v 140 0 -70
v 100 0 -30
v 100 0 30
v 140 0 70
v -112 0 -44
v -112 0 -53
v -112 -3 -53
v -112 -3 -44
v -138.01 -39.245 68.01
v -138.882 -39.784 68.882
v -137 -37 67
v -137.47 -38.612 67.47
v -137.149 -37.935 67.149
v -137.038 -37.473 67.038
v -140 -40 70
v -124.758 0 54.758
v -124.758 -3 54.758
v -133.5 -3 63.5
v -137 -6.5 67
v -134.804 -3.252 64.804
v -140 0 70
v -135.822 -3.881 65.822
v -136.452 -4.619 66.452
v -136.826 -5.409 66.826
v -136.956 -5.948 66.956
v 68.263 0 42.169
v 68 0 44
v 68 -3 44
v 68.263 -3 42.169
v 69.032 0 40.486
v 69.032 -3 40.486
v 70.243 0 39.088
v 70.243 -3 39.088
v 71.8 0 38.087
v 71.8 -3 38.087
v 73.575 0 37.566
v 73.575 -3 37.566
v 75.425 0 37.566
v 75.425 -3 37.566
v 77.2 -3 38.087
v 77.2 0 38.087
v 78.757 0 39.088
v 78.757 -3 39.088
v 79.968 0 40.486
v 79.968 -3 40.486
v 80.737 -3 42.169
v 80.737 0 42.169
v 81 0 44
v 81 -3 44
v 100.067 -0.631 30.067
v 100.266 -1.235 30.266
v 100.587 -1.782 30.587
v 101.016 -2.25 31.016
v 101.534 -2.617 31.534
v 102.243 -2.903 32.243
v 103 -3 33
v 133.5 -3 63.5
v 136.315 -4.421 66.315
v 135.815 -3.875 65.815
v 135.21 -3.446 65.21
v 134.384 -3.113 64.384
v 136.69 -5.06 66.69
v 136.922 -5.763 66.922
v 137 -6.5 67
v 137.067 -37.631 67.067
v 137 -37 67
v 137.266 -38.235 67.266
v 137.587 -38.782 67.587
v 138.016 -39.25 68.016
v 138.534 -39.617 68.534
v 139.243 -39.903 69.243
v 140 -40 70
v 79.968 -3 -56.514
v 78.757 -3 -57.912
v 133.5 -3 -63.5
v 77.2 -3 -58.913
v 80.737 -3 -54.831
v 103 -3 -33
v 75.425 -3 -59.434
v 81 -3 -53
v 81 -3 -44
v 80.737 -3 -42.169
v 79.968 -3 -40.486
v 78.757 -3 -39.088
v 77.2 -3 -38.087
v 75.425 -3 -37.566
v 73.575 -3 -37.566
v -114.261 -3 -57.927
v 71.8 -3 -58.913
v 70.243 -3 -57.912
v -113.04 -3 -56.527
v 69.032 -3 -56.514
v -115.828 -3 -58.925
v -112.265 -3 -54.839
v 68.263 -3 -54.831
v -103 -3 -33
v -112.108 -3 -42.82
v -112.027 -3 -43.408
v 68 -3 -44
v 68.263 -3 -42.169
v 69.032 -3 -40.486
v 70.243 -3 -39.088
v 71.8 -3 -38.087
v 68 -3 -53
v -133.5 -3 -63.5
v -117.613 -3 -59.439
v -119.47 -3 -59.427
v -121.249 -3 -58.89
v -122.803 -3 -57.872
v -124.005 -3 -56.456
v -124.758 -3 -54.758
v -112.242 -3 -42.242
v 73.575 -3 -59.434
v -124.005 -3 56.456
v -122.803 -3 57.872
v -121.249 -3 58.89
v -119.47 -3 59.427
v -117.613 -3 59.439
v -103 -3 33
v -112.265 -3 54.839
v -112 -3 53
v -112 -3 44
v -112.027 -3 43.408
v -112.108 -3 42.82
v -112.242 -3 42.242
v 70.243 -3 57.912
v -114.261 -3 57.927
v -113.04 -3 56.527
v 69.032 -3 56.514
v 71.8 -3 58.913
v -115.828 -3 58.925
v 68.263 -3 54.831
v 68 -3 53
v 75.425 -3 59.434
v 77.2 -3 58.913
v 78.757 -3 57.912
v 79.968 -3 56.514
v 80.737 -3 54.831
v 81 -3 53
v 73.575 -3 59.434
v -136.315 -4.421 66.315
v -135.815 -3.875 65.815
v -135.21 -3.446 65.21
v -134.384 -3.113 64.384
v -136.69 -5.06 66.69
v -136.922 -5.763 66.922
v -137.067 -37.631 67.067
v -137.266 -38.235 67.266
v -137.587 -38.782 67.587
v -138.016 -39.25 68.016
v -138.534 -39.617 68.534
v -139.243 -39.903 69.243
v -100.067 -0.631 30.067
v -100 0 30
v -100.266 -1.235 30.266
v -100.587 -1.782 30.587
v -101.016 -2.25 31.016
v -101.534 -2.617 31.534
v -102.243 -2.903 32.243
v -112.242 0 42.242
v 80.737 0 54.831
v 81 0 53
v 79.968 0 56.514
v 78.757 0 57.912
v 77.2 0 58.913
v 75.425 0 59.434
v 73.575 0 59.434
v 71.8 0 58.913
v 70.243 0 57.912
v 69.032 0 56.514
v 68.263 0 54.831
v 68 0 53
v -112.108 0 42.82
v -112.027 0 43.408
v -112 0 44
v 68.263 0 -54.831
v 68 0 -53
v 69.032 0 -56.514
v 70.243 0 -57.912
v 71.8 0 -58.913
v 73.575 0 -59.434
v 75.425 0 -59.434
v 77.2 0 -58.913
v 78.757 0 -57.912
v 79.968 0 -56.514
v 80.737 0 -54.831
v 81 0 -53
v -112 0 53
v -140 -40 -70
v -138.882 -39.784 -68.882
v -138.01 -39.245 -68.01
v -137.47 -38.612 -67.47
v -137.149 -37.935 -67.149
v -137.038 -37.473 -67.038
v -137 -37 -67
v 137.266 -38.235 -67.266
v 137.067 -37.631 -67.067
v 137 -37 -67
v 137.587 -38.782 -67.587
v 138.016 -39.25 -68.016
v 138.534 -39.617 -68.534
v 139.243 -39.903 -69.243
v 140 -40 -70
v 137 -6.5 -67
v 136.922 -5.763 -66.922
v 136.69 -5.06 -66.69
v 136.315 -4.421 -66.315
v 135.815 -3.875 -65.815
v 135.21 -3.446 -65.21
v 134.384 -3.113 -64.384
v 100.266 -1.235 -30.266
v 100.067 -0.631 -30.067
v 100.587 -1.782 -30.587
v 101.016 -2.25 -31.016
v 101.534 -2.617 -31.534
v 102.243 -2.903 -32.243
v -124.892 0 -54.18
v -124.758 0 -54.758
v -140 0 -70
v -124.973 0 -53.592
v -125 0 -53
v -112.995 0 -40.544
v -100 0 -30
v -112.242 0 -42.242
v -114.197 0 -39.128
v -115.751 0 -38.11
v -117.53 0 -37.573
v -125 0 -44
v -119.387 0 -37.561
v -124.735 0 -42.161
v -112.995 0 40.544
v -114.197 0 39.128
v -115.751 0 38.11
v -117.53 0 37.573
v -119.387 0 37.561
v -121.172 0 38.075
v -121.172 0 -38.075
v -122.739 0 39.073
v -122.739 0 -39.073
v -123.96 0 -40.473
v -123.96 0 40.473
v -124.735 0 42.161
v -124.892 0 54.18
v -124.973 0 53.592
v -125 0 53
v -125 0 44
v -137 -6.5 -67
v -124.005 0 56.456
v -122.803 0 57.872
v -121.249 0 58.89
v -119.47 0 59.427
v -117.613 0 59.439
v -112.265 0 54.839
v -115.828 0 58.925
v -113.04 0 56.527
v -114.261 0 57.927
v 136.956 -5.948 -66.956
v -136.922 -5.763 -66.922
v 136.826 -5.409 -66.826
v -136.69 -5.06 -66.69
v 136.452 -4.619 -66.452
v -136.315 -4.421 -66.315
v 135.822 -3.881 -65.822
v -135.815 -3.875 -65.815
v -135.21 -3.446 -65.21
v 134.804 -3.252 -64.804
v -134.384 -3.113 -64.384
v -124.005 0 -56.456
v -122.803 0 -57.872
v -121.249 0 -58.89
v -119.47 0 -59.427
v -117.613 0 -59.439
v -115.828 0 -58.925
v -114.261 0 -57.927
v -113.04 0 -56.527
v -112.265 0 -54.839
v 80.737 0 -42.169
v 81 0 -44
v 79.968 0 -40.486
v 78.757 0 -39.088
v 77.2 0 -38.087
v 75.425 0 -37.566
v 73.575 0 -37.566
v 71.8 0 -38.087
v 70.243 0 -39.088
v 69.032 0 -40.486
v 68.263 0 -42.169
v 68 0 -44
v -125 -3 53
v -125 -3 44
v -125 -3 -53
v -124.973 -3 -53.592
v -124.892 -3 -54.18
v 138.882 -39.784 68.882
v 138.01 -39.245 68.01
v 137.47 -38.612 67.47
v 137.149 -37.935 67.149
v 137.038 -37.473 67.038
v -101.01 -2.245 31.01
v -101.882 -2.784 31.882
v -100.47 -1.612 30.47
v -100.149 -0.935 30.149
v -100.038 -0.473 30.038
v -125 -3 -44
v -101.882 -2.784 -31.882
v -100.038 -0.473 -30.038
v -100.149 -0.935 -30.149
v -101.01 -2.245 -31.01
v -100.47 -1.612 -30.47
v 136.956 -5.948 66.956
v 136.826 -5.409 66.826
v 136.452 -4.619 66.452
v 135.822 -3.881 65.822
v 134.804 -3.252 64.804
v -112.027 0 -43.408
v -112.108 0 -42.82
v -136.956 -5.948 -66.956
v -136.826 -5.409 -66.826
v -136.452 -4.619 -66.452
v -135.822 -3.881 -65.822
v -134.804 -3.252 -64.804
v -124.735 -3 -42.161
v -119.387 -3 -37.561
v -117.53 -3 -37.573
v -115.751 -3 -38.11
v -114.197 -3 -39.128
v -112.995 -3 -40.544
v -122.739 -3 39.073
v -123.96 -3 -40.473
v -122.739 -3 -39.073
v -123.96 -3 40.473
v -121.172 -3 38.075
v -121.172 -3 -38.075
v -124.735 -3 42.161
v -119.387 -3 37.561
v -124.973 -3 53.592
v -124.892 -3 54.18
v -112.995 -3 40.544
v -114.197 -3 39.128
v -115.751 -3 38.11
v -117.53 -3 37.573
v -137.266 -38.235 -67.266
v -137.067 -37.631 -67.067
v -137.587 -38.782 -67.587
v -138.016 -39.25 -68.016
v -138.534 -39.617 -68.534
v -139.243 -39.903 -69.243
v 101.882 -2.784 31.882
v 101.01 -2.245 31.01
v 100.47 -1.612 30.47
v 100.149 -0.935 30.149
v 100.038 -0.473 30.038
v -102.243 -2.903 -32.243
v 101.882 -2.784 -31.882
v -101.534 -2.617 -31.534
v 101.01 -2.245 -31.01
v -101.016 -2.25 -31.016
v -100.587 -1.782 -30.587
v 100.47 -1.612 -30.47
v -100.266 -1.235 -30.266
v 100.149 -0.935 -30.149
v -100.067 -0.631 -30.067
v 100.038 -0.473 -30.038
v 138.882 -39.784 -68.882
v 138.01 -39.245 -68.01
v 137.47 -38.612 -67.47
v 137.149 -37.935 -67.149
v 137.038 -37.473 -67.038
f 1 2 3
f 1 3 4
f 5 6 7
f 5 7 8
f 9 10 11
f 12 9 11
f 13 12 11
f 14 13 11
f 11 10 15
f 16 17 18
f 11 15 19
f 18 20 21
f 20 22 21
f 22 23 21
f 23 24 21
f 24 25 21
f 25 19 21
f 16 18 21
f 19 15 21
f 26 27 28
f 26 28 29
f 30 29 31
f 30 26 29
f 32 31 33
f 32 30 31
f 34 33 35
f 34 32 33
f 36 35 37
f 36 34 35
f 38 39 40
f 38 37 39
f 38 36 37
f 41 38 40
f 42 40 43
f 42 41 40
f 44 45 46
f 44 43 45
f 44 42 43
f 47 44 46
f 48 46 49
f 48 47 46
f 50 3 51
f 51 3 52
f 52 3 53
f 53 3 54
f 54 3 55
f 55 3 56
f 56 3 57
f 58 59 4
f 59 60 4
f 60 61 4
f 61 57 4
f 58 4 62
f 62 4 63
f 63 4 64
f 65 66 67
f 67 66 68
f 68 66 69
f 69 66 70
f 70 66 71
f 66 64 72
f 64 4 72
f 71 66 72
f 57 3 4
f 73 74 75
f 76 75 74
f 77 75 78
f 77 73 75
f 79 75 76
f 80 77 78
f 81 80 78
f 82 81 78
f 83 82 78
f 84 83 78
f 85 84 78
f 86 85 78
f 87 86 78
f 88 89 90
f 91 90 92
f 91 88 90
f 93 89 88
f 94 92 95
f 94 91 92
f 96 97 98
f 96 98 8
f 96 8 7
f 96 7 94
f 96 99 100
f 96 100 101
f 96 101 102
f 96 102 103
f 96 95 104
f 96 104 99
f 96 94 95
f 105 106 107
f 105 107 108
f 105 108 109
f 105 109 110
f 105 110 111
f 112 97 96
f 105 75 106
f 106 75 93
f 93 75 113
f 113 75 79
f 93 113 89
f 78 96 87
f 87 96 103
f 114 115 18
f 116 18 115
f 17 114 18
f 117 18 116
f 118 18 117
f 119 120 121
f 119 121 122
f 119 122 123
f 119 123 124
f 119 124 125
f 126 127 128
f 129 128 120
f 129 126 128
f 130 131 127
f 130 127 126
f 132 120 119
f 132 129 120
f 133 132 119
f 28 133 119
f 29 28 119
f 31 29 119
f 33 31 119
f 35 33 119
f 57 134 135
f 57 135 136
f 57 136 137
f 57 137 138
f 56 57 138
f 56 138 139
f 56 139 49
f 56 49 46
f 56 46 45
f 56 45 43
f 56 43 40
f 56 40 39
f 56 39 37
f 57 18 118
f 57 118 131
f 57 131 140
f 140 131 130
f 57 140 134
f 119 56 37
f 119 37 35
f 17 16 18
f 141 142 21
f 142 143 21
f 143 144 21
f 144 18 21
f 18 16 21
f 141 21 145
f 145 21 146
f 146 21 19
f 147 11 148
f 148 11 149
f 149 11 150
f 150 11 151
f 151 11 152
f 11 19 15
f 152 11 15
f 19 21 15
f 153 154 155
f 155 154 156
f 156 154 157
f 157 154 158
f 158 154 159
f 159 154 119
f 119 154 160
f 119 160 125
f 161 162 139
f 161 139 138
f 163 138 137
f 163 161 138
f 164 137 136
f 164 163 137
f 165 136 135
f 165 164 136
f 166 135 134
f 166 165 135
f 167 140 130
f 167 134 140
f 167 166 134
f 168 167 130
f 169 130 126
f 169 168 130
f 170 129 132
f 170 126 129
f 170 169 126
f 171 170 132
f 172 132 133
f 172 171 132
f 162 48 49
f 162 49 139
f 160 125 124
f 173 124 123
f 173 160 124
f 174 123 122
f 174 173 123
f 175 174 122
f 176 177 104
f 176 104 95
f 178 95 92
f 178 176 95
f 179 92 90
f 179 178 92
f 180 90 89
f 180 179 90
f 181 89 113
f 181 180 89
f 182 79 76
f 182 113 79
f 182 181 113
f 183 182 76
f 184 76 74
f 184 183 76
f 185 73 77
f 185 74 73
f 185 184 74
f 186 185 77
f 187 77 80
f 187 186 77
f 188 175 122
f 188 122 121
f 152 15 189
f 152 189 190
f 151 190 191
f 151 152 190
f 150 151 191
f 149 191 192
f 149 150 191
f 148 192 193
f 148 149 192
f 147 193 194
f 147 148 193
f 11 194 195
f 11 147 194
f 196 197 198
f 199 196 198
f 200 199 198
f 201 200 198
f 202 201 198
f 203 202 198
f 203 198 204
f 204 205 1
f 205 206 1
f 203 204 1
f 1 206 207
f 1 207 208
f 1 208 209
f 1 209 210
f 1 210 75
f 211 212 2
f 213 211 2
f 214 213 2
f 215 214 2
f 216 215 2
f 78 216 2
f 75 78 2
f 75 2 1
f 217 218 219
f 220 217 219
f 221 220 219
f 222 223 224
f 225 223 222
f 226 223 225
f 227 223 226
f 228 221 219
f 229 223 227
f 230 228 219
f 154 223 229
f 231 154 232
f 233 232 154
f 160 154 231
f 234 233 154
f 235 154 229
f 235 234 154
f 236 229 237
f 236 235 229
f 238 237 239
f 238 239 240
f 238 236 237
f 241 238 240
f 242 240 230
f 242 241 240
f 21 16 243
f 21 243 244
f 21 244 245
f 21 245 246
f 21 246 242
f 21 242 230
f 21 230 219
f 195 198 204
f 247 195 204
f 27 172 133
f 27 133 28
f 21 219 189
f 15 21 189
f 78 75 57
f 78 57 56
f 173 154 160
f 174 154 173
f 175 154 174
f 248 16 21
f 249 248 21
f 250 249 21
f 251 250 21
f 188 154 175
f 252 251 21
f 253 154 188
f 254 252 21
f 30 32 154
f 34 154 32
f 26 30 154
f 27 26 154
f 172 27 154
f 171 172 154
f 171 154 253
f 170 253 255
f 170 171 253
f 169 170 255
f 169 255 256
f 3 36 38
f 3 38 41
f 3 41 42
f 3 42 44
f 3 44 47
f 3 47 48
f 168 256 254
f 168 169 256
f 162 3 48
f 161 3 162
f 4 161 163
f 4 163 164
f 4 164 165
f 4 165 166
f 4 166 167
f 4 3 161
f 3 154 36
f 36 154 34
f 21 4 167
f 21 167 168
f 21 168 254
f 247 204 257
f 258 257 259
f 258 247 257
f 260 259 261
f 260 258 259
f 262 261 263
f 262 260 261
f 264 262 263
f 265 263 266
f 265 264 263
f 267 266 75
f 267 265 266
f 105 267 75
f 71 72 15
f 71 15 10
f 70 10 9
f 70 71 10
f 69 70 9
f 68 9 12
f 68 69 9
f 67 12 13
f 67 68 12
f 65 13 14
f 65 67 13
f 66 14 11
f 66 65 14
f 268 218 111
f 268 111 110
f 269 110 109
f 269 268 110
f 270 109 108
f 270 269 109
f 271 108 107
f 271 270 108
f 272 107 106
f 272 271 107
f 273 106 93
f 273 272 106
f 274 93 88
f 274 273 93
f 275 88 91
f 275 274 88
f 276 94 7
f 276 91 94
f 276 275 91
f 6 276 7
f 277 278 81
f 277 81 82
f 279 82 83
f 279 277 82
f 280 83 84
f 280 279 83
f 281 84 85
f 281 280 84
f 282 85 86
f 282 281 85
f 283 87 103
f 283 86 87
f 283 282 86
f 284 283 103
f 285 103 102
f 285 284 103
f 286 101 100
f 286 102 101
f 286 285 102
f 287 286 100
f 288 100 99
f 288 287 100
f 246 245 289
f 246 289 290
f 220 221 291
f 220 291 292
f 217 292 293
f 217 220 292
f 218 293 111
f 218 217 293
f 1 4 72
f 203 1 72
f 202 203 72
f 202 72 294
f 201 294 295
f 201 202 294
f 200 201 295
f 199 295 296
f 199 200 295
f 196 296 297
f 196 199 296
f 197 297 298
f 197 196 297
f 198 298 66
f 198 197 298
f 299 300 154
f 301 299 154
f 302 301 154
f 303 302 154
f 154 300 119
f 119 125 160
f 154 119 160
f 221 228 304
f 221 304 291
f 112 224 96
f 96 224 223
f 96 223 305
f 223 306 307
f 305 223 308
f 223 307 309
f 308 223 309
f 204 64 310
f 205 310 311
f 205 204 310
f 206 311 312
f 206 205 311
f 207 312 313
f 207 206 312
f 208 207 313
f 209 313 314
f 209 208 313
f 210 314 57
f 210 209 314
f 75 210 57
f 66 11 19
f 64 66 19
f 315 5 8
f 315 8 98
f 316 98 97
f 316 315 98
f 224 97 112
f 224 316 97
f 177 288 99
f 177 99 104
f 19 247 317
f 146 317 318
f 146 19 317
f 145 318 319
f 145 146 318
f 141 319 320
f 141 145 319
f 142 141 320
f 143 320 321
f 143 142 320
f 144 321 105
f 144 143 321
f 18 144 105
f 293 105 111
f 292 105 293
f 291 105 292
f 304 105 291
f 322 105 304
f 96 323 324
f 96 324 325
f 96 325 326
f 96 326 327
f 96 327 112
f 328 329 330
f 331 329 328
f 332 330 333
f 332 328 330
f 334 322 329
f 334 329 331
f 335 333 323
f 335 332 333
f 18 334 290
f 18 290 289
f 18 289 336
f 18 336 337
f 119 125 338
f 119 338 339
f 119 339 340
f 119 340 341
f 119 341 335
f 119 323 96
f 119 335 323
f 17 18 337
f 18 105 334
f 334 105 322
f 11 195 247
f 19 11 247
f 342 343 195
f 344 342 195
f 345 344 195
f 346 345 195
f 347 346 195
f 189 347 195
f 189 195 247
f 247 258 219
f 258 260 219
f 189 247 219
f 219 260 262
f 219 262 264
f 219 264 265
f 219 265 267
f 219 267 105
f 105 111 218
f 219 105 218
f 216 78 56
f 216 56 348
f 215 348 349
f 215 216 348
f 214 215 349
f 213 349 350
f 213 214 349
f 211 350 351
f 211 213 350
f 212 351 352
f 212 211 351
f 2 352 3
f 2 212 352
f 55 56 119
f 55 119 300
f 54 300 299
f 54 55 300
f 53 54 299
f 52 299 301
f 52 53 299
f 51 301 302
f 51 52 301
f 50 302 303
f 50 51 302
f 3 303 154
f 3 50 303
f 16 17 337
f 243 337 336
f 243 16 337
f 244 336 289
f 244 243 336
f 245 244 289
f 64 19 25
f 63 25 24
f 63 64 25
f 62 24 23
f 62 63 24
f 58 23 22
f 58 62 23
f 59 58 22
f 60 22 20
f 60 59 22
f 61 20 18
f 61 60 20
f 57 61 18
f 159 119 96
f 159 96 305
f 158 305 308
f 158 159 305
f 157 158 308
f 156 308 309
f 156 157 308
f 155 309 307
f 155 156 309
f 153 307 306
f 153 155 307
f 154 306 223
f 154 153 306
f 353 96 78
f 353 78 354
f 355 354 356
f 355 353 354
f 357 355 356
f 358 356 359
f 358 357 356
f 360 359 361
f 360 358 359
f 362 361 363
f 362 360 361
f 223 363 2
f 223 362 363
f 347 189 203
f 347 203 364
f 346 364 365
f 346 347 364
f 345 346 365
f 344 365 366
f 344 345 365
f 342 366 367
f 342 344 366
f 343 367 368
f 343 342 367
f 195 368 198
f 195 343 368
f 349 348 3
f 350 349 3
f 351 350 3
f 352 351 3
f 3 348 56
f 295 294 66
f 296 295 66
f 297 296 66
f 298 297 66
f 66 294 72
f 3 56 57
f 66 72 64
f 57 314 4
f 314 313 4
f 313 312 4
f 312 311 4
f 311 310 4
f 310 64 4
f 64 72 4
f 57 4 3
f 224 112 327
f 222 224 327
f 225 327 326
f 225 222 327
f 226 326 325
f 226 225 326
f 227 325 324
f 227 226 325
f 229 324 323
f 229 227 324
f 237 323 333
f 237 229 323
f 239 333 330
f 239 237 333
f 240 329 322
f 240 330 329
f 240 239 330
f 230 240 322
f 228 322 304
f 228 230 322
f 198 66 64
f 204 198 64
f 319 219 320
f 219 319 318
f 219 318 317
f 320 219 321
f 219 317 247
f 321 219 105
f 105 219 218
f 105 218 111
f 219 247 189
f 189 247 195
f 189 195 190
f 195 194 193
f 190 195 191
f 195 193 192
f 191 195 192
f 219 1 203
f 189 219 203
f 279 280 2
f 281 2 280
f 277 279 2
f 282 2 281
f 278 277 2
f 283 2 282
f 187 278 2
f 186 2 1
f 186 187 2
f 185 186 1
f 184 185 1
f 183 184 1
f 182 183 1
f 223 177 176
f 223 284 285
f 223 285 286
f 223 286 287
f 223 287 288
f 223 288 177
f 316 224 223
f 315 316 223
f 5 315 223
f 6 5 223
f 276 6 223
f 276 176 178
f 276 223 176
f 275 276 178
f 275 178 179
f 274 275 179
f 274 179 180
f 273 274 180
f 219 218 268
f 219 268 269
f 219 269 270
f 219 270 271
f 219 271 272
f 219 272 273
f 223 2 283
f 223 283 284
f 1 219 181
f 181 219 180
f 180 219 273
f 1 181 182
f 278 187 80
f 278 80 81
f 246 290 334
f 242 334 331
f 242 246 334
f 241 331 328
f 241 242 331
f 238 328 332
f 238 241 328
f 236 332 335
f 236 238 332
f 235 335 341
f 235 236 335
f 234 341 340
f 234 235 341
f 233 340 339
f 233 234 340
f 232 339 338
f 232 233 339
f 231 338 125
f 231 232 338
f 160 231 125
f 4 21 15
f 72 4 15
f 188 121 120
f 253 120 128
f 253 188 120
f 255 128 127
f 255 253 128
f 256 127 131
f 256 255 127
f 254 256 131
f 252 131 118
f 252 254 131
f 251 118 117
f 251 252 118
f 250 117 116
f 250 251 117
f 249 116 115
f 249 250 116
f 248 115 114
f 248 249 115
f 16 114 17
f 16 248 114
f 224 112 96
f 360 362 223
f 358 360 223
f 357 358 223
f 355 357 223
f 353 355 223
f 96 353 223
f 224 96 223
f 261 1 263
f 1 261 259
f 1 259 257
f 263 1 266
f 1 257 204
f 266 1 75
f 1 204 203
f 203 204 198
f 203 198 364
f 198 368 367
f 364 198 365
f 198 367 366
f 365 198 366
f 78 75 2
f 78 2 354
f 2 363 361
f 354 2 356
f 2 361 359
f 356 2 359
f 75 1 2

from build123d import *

# Parameters (mm, degrees)
IRON_V40X40X3_1_DEPTH      = 197.568542495
IRON_V40X40X3_1_DEPTH_BACK = 57.568542495
IRON_V40X40X3_1_2_DEPTH    = 395.13708499
IRON_V40X40X3_1_3_DEPTH    = 255.13708499
IRON_V40X40X3_1_4_DEPTH    = 395.13708499
CUT_EXTRUDE1_DEPTH         = 10


with BuildPart() as part:
    # Sketch1 → Iron V40X40X3(1) (new, two sides: drawn at the far end of the back side and taken through both)
    with BuildSketch(Plane(origin=(-140, 0, 70), x_dir=(1, 0, 0), z_dir=(0, 0, -1)).offset(-IRON_V40X40X3_1_DEPTH_BACK)):
        with BuildLine():
            Line((0, 0), (0, 40))
            ThreePointArc((0, 40), (2.121320344, 39.121320344), (3, 37))
            Line((3, 37), (3, 6.5))
            ThreePointArc((3, 6.5), (4.025126266, 4.025126266), (6.5, 3))
            Line((6.5, 3), (37, 3))
            ThreePointArc((37, 3), (39.121320344, 2.121320344), (40, 0))
            Line((40, 0), (0, 0))
        make_face()
    extrude(amount=IRON_V40X40X3_1_DEPTH + IRON_V40X40X3_1_DEPTH_BACK)

    # Iron V40X40X3(1) mitre 1
    split(bisect_by=Plane(origin=(-140, 0, 70), x_dir=(0, -1, 0), z_dir=(-0.707106781, 0, -0.707106781)), keep=Keep.TOP)

    # Iron V40X40X3(1) mitre 2
    split(bisect_by=Plane(origin=(-140, 0, -70), x_dir=(0, -1, 0), z_dir=(-0.707106781, 0, 0.707106781)), keep=Keep.TOP)


with BuildPart() as body_2:
    # Sketch1 on segment 2 (carried to segment 2) → Iron V40X40X3_1 2 (new body)
    with BuildSketch(Plane(origin=(-197.568542495, 0, -70), x_dir=(0, 0, 1), z_dir=(1, 0, 0))):
        with BuildLine():
            Line((0, 0), (0, 40))
            ThreePointArc((0, 40), (2.121320344, 39.121320344), (3, 37))
            Line((3, 37), (3, 6.5))
            ThreePointArc((3, 6.5), (4.025126266, 4.025126266), (6.5, 3))
            Line((6.5, 3), (37, 3))
            ThreePointArc((37, 3), (39.121320344, 2.121320344), (40, 0))
            Line((40, 0), (0, 0))
        make_face()
    extrude(amount=IRON_V40X40X3_1_2_DEPTH)

    # Iron V40X40X3_1 2 mitre 1
    split(bisect_by=Plane(origin=(-140, 0, -70), x_dir=(0, 1, 0), z_dir=(0.707106781, 0, -0.707106781)), keep=Keep.TOP)

    # Iron V40X40X3_1 2 mitre 2
    split(bisect_by=Plane(origin=(140, 0, -70), x_dir=(0, -1, 0), z_dir=(-0.707106781, 0, -0.707106781)), keep=Keep.TOP)


with BuildPart() as body_3:
    # Sketch1 on segment 3 (carried to segment 3) → Iron V40X40X3_1 3 (new body)
    with BuildSketch(Plane(origin=(140, 0, -127.568542495), x_dir=(-1, 0, 0), z_dir=(0, 0, 1))):
        with BuildLine():
            Line((0, 0), (0, 40))
            ThreePointArc((0, 40), (2.121320344, 39.121320344), (3, 37))
            Line((3, 37), (3, 6.5))
            ThreePointArc((3, 6.5), (4.025126266, 4.025126266), (6.5, 3))
            Line((6.5, 3), (37, 3))
            ThreePointArc((37, 3), (39.121320344, 2.121320344), (40, 0))
            Line((40, 0), (0, 0))
        make_face()
    extrude(amount=IRON_V40X40X3_1_3_DEPTH)

    # Iron V40X40X3_1 3 mitre 1
    split(bisect_by=Plane(origin=(140, 0, 70), x_dir=(0, 1, 0), z_dir=(0.707106781, 0, -0.707106781)), keep=Keep.TOP)

    # Iron V40X40X3_1 3 mitre 2
    split(bisect_by=Plane(origin=(140, 0, -70), x_dir=(0, 1, 0), z_dir=(0.707106781, 0, 0.707106781)), keep=Keep.TOP)


with BuildPart() as body_4:
    # Sketch1 on segment 4 (carried to segment 4) → Iron V40X40X3_1 4 (new body)
    with BuildSketch(Plane(origin=(197.568542495, 0, 70), x_dir=(0, 0, -1), z_dir=(-1, 0, 0))):
        with BuildLine():
            Line((0, 0), (0, 40))
            ThreePointArc((0, 40), (2.121320344, 39.121320344), (3, 37))
            Line((3, 37), (3, 6.5))
            ThreePointArc((3, 6.5), (4.025126266, 4.025126266), (6.5, 3))
            Line((6.5, 3), (37, 3))
            ThreePointArc((37, 3), (39.121320344, 2.121320344), (40, 0))
            Line((40, 0), (0, 0))
        make_face()
    extrude(amount=IRON_V40X40X3_1_4_DEPTH)

    # Iron V40X40X3_1 4 mitre 1
    split(bisect_by=Plane(origin=(-140, 0, 70), x_dir=(0, 1, 0), z_dir=(0.707106781, 0, 0.707106781)), keep=Keep.TOP)

    # Iron V40X40X3_1 4 mitre 2
    split(bisect_by=Plane(origin=(140, 0, 70), x_dir=(0, -1, 0), z_dir=(-0.707106781, 0, 0.707106781)), keep=Keep.TOP)


with BuildPart() as cut_extrude1_tool:
    # Sketch2 → Cut-Extrude1 (new body)
    with BuildSketch(Plane(origin=(0, 0, 0), x_dir=(1, 0, 0), z_dir=(0, 1, 0))):
        with BuildLine():
            Line((81, 53), (81, 44))
            ThreePointArc((81, 44), (74.5, 37.5), (68, 44))
            Line((68, 44), (68, 53))
            ThreePointArc((68, 53), (74.5, 59.5), (81, 53))
        make_face()
        with BuildLine():
            Line((-112, 53), (-112, 44))
            ThreePointArc((-112, 44), (-118.5, 37.5), (-125, 44))
            Line((-125, 44), (-125, 53))
            ThreePointArc((-125, 53), (-118.5, 59.5), (-112, 53))
        make_face()
        with BuildLine():
            Line((-112, -44), (-112, -53))
            ThreePointArc((-112, -53), (-118.5, -59.5), (-125, -53))
            Line((-125, -53), (-125, -44))
            ThreePointArc((-125, -44), (-118.5, -37.5), (-112, -44))
        make_face()
        with BuildLine():
            Line((81, -44), (81, -53))
            ThreePointArc((81, -53), (74.5, -59.5), (68, -53))
            Line((68, -53), (68, -44))
            ThreePointArc((68, -44), (74.5, -37.5), (81, -44))
        make_face()
    extrude(amount=-CUT_EXTRUDE1_DEPTH)


with BuildPart() as part_1:
    add(part.part)

    # Cut-Extrude1: cut by cut_extrude1_tool
    add(cut_extrude1_tool.part, mode=Mode.SUBTRACT)


with BuildPart() as body_2_1:
    add(body_2.part)

    # Cut-Extrude1: cut by cut_extrude1_tool
    add(cut_extrude1_tool.part, mode=Mode.SUBTRACT)


with BuildPart() as body_4_1:
    add(body_4.part)

    # Cut-Extrude1: cut by cut_extrude1_tool
    add(cut_extrude1_tool.part, mode=Mode.SUBTRACT)


solid = Compound([body_3.part, part_1.part, body_2_1.part, body_4_1.part])
